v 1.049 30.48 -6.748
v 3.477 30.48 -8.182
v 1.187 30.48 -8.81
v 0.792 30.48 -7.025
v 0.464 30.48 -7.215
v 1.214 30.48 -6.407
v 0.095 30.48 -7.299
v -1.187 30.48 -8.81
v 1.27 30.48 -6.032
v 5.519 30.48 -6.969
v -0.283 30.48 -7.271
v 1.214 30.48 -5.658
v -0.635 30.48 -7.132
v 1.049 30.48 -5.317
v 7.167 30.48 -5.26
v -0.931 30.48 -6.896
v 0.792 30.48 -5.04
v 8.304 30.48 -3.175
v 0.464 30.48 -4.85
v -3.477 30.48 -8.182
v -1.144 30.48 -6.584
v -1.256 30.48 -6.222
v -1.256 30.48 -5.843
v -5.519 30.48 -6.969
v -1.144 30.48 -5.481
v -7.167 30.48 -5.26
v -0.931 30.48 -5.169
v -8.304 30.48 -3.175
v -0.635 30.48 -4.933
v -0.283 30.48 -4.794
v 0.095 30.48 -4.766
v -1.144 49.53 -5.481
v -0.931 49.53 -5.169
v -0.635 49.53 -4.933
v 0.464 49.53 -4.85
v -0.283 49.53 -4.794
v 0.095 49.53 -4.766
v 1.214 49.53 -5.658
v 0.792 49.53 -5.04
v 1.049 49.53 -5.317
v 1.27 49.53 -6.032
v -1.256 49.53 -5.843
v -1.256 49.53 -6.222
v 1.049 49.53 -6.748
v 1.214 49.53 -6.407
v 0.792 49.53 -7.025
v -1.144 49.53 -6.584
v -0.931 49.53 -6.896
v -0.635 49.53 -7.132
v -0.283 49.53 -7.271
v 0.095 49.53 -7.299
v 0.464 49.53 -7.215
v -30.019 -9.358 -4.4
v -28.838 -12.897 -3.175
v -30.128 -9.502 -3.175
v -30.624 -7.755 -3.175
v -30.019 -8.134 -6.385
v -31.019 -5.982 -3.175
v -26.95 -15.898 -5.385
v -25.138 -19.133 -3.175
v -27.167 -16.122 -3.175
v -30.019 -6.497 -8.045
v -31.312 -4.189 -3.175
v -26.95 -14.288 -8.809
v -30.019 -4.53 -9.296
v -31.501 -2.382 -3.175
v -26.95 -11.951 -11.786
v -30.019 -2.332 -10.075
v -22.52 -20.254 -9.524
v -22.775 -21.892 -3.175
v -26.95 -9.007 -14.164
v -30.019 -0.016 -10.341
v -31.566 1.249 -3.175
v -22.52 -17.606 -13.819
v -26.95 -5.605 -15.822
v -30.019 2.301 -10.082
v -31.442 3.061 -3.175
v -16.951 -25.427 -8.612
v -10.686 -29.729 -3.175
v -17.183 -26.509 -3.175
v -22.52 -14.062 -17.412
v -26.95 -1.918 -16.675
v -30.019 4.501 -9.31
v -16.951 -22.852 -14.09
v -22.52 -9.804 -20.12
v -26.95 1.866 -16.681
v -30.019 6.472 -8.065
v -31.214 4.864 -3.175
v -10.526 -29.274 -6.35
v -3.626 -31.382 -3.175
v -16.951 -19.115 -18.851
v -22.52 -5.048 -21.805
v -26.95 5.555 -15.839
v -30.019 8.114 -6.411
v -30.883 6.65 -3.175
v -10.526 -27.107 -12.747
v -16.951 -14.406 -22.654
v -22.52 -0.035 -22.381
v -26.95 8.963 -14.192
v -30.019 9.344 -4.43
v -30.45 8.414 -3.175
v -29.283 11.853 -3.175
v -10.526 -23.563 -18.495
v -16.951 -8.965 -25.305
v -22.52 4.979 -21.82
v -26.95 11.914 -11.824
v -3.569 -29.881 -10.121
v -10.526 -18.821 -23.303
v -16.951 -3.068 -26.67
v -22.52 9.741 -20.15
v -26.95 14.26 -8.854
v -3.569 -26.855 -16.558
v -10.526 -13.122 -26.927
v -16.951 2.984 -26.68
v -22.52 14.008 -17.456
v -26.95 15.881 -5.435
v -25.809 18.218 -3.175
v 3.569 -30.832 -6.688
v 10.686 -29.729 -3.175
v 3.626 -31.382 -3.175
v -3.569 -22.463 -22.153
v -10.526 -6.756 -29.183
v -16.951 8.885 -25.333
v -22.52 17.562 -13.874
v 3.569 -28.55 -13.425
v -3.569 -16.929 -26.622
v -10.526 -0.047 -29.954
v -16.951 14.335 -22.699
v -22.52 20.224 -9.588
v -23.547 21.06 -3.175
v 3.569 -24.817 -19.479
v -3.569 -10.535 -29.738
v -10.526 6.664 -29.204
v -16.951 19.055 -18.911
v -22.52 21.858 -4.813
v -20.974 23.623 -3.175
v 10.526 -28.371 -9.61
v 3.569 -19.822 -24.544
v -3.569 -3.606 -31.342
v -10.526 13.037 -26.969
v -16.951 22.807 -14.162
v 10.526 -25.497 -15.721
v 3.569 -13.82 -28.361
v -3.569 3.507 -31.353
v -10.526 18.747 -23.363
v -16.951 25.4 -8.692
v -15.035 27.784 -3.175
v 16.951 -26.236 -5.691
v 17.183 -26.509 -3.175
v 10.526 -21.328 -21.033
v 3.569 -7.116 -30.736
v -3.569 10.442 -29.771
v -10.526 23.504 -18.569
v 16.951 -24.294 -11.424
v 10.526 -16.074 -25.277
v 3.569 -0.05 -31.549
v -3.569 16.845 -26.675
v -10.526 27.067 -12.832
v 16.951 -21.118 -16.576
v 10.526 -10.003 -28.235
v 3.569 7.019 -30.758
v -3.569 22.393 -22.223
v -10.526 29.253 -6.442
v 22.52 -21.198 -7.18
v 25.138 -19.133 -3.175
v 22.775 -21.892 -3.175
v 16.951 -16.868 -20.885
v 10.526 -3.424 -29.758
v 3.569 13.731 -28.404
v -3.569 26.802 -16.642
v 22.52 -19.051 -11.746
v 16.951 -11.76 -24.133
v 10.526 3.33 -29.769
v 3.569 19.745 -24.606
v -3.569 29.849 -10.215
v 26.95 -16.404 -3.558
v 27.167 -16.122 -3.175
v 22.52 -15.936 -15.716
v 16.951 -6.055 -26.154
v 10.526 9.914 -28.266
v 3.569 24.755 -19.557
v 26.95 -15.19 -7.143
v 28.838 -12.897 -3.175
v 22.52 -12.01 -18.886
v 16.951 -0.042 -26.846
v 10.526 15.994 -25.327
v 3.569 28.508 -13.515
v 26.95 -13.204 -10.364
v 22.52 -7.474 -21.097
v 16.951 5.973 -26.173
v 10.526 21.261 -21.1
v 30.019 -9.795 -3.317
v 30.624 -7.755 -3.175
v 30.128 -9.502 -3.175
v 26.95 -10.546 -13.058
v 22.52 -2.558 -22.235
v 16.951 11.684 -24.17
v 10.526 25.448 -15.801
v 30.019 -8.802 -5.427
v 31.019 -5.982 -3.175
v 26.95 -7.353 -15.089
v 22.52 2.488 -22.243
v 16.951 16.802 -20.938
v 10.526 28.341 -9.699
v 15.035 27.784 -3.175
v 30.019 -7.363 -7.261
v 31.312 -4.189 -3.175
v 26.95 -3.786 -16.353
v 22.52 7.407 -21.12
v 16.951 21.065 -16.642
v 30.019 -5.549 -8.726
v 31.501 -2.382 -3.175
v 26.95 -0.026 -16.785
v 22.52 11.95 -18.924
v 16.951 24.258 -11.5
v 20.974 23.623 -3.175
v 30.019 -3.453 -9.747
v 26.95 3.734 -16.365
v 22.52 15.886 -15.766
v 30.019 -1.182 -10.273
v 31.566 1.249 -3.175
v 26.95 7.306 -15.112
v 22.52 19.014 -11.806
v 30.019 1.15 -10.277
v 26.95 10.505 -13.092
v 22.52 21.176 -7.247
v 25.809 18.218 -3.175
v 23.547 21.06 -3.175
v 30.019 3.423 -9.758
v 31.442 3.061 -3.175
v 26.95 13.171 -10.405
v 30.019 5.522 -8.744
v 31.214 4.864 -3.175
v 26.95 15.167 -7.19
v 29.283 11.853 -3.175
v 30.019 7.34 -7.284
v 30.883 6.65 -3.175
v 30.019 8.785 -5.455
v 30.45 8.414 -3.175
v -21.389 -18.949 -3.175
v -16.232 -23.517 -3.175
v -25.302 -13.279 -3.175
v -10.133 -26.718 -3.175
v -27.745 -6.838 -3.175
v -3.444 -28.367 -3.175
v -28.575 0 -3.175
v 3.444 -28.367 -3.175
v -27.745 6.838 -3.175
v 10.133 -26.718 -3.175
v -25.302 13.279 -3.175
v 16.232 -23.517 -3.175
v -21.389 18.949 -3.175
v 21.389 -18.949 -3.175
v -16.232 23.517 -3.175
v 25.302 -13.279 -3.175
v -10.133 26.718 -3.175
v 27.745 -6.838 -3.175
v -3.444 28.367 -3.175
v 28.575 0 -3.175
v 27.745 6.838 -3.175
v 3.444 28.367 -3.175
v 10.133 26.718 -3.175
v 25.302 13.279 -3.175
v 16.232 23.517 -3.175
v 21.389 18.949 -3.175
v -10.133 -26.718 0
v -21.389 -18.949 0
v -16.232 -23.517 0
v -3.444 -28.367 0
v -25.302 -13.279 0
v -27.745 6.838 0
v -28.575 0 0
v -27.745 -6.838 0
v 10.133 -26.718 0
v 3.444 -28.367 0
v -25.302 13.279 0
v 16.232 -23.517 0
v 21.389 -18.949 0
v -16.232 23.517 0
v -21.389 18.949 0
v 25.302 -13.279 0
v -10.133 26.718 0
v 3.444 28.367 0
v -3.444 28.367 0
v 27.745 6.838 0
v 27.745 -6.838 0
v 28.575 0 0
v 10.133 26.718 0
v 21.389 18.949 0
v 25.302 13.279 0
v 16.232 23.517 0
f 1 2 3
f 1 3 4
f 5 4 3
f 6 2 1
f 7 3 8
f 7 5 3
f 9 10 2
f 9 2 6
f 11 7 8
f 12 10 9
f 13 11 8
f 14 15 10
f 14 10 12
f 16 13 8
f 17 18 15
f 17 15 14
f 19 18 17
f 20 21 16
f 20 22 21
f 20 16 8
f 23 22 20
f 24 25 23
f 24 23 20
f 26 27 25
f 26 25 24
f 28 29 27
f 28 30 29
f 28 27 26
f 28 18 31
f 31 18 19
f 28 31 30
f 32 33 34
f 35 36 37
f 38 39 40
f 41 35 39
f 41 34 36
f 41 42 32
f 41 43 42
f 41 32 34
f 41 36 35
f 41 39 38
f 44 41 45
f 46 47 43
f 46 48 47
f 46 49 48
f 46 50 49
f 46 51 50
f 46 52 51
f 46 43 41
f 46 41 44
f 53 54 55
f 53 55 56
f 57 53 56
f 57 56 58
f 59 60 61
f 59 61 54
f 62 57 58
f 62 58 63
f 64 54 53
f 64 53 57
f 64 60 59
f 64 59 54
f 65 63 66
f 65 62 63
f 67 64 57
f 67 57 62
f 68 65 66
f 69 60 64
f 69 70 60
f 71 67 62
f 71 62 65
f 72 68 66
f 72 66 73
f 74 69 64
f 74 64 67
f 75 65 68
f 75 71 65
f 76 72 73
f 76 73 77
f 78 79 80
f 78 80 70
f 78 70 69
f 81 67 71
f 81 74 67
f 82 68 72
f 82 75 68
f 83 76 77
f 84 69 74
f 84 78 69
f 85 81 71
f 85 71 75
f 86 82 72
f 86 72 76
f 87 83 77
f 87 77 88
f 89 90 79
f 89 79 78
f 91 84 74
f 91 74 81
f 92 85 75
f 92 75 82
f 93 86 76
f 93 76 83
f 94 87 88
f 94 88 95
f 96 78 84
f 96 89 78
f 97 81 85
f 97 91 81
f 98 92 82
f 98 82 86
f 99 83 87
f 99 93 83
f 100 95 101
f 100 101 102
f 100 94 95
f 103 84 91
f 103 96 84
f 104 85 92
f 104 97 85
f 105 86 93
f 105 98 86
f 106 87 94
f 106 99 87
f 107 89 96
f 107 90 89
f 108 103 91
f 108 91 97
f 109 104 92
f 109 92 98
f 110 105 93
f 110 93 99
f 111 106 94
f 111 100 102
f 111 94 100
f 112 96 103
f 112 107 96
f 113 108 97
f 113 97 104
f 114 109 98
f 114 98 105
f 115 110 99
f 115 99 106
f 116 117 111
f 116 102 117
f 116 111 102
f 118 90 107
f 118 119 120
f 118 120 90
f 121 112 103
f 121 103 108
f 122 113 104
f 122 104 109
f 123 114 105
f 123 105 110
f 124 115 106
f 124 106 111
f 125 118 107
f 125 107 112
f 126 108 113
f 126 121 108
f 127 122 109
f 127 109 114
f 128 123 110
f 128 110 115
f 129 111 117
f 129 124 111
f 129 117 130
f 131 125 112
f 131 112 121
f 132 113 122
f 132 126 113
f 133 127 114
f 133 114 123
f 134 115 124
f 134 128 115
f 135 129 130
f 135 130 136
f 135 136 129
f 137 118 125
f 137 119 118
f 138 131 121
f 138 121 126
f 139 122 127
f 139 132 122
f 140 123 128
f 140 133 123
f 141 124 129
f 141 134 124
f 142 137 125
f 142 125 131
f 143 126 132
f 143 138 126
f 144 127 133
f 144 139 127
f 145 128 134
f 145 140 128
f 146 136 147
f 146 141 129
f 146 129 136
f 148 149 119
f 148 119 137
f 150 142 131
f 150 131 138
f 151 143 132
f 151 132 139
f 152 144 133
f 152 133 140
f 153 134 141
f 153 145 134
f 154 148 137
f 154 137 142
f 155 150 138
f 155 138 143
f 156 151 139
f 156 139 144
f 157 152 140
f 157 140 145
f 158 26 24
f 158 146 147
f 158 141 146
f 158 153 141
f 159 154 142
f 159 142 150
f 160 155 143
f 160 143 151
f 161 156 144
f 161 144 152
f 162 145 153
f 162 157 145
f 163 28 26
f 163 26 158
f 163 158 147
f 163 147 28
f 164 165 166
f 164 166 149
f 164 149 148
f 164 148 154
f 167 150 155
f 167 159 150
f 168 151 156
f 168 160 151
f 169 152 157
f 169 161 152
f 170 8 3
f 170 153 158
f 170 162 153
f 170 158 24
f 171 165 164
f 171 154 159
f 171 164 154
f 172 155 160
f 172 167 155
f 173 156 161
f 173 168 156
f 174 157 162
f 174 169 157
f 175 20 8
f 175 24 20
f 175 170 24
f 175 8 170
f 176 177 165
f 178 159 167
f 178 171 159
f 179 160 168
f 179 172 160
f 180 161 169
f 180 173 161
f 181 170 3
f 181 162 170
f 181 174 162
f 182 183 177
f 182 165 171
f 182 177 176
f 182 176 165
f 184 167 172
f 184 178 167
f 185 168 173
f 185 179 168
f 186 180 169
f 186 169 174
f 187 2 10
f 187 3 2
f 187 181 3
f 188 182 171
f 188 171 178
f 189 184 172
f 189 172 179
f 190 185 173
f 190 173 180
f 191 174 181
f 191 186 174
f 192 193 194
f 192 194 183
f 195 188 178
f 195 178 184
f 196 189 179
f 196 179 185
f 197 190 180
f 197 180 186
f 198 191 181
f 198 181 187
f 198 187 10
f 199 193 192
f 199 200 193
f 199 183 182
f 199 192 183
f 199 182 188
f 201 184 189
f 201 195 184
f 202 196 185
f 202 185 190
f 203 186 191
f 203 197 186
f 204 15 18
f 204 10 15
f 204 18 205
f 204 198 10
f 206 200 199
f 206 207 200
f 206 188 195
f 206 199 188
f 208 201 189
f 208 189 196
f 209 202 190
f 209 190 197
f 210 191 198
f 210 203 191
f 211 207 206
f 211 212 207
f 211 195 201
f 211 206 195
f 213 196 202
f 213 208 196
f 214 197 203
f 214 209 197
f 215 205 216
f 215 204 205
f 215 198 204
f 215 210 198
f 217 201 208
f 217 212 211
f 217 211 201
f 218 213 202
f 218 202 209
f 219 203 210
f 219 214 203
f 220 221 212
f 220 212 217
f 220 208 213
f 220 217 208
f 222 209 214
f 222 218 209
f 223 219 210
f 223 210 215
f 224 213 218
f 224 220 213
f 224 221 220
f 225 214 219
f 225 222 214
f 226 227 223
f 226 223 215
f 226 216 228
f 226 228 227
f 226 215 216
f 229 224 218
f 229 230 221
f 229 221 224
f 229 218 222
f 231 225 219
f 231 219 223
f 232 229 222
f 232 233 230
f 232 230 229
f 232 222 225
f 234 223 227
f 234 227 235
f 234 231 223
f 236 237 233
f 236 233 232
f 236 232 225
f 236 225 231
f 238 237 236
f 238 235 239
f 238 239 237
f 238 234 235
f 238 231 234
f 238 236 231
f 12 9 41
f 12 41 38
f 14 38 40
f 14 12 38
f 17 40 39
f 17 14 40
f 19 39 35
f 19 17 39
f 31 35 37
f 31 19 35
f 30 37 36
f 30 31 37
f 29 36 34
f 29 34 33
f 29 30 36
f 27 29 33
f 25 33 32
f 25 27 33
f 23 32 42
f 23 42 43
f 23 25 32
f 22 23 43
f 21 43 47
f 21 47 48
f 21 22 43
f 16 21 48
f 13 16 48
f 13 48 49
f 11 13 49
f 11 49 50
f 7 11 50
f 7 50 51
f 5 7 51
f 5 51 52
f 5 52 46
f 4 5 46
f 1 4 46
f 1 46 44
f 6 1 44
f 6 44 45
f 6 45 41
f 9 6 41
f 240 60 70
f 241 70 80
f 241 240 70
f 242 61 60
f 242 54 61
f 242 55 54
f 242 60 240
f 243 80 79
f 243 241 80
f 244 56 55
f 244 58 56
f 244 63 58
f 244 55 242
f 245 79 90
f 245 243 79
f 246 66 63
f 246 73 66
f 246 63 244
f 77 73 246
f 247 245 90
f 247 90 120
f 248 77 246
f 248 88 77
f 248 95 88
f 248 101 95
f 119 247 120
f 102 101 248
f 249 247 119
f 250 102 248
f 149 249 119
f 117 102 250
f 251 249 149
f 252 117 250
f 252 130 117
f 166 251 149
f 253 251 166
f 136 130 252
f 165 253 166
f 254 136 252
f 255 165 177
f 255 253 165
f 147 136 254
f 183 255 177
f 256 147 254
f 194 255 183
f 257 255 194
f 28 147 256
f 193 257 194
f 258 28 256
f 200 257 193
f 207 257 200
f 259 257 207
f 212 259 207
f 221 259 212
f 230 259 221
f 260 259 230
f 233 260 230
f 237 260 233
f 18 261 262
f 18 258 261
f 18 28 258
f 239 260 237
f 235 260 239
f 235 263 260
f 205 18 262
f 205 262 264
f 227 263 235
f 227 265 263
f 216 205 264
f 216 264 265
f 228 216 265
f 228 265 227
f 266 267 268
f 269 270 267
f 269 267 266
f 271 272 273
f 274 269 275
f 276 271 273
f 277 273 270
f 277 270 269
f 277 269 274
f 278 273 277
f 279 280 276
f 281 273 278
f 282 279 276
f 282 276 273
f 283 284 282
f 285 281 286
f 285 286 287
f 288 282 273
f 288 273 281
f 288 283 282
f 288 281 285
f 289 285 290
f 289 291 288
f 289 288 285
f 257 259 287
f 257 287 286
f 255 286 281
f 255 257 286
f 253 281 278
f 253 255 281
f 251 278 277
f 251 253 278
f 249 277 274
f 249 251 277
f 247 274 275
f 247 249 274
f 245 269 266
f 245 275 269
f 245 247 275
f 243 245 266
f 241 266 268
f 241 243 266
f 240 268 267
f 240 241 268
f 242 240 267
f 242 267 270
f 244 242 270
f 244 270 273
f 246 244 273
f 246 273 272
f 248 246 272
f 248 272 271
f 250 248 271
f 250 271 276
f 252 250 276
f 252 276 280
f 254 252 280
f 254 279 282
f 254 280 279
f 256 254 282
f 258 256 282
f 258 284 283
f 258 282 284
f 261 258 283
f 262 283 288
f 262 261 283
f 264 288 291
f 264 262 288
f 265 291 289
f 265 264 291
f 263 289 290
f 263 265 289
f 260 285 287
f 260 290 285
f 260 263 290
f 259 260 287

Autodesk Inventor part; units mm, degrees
ref_plane "YZ Plane" through (0, 0, 0) normal (1, 0, 0) x (0, 1, 0)
ref_plane "XZ Plane" through (0, 0, 0) normal (0, 1, 0) x (-1, 0, 0)
ref_plane "XY Plane" through (0, 0, 0) normal (0, 0, 1) x (1, 0, 0)
sketch "Sketch6" plane through (0, 0, 0) normal (0, 0, 1) x (1, 0, 0)
  arc A0 (-31.75, 0) -> (31.75, 0) centre (0, 0) ccw
  line L0 (-31.75, 0) -> (31.75, 0)
revolve "Revolution2" add sketch "Sketch6" angle 180 about axis through (-31.75, 0, 0) along (1, 0, 0)
sketch "Sketch9" plane through (0, 0, 0) normal (0, 0, 1) x (1, 0, 0)
  circle A0 centre (0, 0) radius 31.75
extrude "Extrusion5" cut sketch "Sketch9" against normal blind 3.175
sketch "Sketch10" plane through (0, 0, -3.175) normal (0, 0, 1) x (1, 0, 0)
  circle A0 centre (0, 0) radius 28.575
extrude "Extrusion6" add sketch "Sketch10" along normal blind 3.175
sketch "Sketch11" plane through (0, 0, 0) normal (0, 1, 0) x (-1, 0, 0)
  arc A0 (-31.7973, 0) -> (31.7973, 0) centre (0, 0) ccw
  line L0 (31.7973, 0) -> (-31.7973, 0)
  line L1 (-31.5909, -3.175) -> (31.5909, -3.175) projected
extrude "Extrusion7" cut sketch "Sketch11" along normal blind 30.48 and the other way blind 31.75 keep common part
sketch "Sketch12" plane through (0, 30.48, 0) normal (0, 1, 0) x (1, 0, 0)
  line L0 (28.575, 3.175) -> (-28.575, 3.175) projected
  line L1 (0, 3.175) -> (0, 8.89)
  arc A0 (8.3037, 3.175) -> (-8.3037, 3.175) centre (0, 0) ccw projected
  line L2 (0, 3.175) -> (0, 6.0325)
  circle A1 centre (0, 6.0325) radius 1.27
  dimension "d29" = 5.715
  dimension "d30" = 2.8575
  dimension "d31" = 2.54
extrude "Extrusion8" add sketch "Sketch12" along normal blind 19.05 contours A1 L1 | L1 A1
properties part number "bulb turning point"
